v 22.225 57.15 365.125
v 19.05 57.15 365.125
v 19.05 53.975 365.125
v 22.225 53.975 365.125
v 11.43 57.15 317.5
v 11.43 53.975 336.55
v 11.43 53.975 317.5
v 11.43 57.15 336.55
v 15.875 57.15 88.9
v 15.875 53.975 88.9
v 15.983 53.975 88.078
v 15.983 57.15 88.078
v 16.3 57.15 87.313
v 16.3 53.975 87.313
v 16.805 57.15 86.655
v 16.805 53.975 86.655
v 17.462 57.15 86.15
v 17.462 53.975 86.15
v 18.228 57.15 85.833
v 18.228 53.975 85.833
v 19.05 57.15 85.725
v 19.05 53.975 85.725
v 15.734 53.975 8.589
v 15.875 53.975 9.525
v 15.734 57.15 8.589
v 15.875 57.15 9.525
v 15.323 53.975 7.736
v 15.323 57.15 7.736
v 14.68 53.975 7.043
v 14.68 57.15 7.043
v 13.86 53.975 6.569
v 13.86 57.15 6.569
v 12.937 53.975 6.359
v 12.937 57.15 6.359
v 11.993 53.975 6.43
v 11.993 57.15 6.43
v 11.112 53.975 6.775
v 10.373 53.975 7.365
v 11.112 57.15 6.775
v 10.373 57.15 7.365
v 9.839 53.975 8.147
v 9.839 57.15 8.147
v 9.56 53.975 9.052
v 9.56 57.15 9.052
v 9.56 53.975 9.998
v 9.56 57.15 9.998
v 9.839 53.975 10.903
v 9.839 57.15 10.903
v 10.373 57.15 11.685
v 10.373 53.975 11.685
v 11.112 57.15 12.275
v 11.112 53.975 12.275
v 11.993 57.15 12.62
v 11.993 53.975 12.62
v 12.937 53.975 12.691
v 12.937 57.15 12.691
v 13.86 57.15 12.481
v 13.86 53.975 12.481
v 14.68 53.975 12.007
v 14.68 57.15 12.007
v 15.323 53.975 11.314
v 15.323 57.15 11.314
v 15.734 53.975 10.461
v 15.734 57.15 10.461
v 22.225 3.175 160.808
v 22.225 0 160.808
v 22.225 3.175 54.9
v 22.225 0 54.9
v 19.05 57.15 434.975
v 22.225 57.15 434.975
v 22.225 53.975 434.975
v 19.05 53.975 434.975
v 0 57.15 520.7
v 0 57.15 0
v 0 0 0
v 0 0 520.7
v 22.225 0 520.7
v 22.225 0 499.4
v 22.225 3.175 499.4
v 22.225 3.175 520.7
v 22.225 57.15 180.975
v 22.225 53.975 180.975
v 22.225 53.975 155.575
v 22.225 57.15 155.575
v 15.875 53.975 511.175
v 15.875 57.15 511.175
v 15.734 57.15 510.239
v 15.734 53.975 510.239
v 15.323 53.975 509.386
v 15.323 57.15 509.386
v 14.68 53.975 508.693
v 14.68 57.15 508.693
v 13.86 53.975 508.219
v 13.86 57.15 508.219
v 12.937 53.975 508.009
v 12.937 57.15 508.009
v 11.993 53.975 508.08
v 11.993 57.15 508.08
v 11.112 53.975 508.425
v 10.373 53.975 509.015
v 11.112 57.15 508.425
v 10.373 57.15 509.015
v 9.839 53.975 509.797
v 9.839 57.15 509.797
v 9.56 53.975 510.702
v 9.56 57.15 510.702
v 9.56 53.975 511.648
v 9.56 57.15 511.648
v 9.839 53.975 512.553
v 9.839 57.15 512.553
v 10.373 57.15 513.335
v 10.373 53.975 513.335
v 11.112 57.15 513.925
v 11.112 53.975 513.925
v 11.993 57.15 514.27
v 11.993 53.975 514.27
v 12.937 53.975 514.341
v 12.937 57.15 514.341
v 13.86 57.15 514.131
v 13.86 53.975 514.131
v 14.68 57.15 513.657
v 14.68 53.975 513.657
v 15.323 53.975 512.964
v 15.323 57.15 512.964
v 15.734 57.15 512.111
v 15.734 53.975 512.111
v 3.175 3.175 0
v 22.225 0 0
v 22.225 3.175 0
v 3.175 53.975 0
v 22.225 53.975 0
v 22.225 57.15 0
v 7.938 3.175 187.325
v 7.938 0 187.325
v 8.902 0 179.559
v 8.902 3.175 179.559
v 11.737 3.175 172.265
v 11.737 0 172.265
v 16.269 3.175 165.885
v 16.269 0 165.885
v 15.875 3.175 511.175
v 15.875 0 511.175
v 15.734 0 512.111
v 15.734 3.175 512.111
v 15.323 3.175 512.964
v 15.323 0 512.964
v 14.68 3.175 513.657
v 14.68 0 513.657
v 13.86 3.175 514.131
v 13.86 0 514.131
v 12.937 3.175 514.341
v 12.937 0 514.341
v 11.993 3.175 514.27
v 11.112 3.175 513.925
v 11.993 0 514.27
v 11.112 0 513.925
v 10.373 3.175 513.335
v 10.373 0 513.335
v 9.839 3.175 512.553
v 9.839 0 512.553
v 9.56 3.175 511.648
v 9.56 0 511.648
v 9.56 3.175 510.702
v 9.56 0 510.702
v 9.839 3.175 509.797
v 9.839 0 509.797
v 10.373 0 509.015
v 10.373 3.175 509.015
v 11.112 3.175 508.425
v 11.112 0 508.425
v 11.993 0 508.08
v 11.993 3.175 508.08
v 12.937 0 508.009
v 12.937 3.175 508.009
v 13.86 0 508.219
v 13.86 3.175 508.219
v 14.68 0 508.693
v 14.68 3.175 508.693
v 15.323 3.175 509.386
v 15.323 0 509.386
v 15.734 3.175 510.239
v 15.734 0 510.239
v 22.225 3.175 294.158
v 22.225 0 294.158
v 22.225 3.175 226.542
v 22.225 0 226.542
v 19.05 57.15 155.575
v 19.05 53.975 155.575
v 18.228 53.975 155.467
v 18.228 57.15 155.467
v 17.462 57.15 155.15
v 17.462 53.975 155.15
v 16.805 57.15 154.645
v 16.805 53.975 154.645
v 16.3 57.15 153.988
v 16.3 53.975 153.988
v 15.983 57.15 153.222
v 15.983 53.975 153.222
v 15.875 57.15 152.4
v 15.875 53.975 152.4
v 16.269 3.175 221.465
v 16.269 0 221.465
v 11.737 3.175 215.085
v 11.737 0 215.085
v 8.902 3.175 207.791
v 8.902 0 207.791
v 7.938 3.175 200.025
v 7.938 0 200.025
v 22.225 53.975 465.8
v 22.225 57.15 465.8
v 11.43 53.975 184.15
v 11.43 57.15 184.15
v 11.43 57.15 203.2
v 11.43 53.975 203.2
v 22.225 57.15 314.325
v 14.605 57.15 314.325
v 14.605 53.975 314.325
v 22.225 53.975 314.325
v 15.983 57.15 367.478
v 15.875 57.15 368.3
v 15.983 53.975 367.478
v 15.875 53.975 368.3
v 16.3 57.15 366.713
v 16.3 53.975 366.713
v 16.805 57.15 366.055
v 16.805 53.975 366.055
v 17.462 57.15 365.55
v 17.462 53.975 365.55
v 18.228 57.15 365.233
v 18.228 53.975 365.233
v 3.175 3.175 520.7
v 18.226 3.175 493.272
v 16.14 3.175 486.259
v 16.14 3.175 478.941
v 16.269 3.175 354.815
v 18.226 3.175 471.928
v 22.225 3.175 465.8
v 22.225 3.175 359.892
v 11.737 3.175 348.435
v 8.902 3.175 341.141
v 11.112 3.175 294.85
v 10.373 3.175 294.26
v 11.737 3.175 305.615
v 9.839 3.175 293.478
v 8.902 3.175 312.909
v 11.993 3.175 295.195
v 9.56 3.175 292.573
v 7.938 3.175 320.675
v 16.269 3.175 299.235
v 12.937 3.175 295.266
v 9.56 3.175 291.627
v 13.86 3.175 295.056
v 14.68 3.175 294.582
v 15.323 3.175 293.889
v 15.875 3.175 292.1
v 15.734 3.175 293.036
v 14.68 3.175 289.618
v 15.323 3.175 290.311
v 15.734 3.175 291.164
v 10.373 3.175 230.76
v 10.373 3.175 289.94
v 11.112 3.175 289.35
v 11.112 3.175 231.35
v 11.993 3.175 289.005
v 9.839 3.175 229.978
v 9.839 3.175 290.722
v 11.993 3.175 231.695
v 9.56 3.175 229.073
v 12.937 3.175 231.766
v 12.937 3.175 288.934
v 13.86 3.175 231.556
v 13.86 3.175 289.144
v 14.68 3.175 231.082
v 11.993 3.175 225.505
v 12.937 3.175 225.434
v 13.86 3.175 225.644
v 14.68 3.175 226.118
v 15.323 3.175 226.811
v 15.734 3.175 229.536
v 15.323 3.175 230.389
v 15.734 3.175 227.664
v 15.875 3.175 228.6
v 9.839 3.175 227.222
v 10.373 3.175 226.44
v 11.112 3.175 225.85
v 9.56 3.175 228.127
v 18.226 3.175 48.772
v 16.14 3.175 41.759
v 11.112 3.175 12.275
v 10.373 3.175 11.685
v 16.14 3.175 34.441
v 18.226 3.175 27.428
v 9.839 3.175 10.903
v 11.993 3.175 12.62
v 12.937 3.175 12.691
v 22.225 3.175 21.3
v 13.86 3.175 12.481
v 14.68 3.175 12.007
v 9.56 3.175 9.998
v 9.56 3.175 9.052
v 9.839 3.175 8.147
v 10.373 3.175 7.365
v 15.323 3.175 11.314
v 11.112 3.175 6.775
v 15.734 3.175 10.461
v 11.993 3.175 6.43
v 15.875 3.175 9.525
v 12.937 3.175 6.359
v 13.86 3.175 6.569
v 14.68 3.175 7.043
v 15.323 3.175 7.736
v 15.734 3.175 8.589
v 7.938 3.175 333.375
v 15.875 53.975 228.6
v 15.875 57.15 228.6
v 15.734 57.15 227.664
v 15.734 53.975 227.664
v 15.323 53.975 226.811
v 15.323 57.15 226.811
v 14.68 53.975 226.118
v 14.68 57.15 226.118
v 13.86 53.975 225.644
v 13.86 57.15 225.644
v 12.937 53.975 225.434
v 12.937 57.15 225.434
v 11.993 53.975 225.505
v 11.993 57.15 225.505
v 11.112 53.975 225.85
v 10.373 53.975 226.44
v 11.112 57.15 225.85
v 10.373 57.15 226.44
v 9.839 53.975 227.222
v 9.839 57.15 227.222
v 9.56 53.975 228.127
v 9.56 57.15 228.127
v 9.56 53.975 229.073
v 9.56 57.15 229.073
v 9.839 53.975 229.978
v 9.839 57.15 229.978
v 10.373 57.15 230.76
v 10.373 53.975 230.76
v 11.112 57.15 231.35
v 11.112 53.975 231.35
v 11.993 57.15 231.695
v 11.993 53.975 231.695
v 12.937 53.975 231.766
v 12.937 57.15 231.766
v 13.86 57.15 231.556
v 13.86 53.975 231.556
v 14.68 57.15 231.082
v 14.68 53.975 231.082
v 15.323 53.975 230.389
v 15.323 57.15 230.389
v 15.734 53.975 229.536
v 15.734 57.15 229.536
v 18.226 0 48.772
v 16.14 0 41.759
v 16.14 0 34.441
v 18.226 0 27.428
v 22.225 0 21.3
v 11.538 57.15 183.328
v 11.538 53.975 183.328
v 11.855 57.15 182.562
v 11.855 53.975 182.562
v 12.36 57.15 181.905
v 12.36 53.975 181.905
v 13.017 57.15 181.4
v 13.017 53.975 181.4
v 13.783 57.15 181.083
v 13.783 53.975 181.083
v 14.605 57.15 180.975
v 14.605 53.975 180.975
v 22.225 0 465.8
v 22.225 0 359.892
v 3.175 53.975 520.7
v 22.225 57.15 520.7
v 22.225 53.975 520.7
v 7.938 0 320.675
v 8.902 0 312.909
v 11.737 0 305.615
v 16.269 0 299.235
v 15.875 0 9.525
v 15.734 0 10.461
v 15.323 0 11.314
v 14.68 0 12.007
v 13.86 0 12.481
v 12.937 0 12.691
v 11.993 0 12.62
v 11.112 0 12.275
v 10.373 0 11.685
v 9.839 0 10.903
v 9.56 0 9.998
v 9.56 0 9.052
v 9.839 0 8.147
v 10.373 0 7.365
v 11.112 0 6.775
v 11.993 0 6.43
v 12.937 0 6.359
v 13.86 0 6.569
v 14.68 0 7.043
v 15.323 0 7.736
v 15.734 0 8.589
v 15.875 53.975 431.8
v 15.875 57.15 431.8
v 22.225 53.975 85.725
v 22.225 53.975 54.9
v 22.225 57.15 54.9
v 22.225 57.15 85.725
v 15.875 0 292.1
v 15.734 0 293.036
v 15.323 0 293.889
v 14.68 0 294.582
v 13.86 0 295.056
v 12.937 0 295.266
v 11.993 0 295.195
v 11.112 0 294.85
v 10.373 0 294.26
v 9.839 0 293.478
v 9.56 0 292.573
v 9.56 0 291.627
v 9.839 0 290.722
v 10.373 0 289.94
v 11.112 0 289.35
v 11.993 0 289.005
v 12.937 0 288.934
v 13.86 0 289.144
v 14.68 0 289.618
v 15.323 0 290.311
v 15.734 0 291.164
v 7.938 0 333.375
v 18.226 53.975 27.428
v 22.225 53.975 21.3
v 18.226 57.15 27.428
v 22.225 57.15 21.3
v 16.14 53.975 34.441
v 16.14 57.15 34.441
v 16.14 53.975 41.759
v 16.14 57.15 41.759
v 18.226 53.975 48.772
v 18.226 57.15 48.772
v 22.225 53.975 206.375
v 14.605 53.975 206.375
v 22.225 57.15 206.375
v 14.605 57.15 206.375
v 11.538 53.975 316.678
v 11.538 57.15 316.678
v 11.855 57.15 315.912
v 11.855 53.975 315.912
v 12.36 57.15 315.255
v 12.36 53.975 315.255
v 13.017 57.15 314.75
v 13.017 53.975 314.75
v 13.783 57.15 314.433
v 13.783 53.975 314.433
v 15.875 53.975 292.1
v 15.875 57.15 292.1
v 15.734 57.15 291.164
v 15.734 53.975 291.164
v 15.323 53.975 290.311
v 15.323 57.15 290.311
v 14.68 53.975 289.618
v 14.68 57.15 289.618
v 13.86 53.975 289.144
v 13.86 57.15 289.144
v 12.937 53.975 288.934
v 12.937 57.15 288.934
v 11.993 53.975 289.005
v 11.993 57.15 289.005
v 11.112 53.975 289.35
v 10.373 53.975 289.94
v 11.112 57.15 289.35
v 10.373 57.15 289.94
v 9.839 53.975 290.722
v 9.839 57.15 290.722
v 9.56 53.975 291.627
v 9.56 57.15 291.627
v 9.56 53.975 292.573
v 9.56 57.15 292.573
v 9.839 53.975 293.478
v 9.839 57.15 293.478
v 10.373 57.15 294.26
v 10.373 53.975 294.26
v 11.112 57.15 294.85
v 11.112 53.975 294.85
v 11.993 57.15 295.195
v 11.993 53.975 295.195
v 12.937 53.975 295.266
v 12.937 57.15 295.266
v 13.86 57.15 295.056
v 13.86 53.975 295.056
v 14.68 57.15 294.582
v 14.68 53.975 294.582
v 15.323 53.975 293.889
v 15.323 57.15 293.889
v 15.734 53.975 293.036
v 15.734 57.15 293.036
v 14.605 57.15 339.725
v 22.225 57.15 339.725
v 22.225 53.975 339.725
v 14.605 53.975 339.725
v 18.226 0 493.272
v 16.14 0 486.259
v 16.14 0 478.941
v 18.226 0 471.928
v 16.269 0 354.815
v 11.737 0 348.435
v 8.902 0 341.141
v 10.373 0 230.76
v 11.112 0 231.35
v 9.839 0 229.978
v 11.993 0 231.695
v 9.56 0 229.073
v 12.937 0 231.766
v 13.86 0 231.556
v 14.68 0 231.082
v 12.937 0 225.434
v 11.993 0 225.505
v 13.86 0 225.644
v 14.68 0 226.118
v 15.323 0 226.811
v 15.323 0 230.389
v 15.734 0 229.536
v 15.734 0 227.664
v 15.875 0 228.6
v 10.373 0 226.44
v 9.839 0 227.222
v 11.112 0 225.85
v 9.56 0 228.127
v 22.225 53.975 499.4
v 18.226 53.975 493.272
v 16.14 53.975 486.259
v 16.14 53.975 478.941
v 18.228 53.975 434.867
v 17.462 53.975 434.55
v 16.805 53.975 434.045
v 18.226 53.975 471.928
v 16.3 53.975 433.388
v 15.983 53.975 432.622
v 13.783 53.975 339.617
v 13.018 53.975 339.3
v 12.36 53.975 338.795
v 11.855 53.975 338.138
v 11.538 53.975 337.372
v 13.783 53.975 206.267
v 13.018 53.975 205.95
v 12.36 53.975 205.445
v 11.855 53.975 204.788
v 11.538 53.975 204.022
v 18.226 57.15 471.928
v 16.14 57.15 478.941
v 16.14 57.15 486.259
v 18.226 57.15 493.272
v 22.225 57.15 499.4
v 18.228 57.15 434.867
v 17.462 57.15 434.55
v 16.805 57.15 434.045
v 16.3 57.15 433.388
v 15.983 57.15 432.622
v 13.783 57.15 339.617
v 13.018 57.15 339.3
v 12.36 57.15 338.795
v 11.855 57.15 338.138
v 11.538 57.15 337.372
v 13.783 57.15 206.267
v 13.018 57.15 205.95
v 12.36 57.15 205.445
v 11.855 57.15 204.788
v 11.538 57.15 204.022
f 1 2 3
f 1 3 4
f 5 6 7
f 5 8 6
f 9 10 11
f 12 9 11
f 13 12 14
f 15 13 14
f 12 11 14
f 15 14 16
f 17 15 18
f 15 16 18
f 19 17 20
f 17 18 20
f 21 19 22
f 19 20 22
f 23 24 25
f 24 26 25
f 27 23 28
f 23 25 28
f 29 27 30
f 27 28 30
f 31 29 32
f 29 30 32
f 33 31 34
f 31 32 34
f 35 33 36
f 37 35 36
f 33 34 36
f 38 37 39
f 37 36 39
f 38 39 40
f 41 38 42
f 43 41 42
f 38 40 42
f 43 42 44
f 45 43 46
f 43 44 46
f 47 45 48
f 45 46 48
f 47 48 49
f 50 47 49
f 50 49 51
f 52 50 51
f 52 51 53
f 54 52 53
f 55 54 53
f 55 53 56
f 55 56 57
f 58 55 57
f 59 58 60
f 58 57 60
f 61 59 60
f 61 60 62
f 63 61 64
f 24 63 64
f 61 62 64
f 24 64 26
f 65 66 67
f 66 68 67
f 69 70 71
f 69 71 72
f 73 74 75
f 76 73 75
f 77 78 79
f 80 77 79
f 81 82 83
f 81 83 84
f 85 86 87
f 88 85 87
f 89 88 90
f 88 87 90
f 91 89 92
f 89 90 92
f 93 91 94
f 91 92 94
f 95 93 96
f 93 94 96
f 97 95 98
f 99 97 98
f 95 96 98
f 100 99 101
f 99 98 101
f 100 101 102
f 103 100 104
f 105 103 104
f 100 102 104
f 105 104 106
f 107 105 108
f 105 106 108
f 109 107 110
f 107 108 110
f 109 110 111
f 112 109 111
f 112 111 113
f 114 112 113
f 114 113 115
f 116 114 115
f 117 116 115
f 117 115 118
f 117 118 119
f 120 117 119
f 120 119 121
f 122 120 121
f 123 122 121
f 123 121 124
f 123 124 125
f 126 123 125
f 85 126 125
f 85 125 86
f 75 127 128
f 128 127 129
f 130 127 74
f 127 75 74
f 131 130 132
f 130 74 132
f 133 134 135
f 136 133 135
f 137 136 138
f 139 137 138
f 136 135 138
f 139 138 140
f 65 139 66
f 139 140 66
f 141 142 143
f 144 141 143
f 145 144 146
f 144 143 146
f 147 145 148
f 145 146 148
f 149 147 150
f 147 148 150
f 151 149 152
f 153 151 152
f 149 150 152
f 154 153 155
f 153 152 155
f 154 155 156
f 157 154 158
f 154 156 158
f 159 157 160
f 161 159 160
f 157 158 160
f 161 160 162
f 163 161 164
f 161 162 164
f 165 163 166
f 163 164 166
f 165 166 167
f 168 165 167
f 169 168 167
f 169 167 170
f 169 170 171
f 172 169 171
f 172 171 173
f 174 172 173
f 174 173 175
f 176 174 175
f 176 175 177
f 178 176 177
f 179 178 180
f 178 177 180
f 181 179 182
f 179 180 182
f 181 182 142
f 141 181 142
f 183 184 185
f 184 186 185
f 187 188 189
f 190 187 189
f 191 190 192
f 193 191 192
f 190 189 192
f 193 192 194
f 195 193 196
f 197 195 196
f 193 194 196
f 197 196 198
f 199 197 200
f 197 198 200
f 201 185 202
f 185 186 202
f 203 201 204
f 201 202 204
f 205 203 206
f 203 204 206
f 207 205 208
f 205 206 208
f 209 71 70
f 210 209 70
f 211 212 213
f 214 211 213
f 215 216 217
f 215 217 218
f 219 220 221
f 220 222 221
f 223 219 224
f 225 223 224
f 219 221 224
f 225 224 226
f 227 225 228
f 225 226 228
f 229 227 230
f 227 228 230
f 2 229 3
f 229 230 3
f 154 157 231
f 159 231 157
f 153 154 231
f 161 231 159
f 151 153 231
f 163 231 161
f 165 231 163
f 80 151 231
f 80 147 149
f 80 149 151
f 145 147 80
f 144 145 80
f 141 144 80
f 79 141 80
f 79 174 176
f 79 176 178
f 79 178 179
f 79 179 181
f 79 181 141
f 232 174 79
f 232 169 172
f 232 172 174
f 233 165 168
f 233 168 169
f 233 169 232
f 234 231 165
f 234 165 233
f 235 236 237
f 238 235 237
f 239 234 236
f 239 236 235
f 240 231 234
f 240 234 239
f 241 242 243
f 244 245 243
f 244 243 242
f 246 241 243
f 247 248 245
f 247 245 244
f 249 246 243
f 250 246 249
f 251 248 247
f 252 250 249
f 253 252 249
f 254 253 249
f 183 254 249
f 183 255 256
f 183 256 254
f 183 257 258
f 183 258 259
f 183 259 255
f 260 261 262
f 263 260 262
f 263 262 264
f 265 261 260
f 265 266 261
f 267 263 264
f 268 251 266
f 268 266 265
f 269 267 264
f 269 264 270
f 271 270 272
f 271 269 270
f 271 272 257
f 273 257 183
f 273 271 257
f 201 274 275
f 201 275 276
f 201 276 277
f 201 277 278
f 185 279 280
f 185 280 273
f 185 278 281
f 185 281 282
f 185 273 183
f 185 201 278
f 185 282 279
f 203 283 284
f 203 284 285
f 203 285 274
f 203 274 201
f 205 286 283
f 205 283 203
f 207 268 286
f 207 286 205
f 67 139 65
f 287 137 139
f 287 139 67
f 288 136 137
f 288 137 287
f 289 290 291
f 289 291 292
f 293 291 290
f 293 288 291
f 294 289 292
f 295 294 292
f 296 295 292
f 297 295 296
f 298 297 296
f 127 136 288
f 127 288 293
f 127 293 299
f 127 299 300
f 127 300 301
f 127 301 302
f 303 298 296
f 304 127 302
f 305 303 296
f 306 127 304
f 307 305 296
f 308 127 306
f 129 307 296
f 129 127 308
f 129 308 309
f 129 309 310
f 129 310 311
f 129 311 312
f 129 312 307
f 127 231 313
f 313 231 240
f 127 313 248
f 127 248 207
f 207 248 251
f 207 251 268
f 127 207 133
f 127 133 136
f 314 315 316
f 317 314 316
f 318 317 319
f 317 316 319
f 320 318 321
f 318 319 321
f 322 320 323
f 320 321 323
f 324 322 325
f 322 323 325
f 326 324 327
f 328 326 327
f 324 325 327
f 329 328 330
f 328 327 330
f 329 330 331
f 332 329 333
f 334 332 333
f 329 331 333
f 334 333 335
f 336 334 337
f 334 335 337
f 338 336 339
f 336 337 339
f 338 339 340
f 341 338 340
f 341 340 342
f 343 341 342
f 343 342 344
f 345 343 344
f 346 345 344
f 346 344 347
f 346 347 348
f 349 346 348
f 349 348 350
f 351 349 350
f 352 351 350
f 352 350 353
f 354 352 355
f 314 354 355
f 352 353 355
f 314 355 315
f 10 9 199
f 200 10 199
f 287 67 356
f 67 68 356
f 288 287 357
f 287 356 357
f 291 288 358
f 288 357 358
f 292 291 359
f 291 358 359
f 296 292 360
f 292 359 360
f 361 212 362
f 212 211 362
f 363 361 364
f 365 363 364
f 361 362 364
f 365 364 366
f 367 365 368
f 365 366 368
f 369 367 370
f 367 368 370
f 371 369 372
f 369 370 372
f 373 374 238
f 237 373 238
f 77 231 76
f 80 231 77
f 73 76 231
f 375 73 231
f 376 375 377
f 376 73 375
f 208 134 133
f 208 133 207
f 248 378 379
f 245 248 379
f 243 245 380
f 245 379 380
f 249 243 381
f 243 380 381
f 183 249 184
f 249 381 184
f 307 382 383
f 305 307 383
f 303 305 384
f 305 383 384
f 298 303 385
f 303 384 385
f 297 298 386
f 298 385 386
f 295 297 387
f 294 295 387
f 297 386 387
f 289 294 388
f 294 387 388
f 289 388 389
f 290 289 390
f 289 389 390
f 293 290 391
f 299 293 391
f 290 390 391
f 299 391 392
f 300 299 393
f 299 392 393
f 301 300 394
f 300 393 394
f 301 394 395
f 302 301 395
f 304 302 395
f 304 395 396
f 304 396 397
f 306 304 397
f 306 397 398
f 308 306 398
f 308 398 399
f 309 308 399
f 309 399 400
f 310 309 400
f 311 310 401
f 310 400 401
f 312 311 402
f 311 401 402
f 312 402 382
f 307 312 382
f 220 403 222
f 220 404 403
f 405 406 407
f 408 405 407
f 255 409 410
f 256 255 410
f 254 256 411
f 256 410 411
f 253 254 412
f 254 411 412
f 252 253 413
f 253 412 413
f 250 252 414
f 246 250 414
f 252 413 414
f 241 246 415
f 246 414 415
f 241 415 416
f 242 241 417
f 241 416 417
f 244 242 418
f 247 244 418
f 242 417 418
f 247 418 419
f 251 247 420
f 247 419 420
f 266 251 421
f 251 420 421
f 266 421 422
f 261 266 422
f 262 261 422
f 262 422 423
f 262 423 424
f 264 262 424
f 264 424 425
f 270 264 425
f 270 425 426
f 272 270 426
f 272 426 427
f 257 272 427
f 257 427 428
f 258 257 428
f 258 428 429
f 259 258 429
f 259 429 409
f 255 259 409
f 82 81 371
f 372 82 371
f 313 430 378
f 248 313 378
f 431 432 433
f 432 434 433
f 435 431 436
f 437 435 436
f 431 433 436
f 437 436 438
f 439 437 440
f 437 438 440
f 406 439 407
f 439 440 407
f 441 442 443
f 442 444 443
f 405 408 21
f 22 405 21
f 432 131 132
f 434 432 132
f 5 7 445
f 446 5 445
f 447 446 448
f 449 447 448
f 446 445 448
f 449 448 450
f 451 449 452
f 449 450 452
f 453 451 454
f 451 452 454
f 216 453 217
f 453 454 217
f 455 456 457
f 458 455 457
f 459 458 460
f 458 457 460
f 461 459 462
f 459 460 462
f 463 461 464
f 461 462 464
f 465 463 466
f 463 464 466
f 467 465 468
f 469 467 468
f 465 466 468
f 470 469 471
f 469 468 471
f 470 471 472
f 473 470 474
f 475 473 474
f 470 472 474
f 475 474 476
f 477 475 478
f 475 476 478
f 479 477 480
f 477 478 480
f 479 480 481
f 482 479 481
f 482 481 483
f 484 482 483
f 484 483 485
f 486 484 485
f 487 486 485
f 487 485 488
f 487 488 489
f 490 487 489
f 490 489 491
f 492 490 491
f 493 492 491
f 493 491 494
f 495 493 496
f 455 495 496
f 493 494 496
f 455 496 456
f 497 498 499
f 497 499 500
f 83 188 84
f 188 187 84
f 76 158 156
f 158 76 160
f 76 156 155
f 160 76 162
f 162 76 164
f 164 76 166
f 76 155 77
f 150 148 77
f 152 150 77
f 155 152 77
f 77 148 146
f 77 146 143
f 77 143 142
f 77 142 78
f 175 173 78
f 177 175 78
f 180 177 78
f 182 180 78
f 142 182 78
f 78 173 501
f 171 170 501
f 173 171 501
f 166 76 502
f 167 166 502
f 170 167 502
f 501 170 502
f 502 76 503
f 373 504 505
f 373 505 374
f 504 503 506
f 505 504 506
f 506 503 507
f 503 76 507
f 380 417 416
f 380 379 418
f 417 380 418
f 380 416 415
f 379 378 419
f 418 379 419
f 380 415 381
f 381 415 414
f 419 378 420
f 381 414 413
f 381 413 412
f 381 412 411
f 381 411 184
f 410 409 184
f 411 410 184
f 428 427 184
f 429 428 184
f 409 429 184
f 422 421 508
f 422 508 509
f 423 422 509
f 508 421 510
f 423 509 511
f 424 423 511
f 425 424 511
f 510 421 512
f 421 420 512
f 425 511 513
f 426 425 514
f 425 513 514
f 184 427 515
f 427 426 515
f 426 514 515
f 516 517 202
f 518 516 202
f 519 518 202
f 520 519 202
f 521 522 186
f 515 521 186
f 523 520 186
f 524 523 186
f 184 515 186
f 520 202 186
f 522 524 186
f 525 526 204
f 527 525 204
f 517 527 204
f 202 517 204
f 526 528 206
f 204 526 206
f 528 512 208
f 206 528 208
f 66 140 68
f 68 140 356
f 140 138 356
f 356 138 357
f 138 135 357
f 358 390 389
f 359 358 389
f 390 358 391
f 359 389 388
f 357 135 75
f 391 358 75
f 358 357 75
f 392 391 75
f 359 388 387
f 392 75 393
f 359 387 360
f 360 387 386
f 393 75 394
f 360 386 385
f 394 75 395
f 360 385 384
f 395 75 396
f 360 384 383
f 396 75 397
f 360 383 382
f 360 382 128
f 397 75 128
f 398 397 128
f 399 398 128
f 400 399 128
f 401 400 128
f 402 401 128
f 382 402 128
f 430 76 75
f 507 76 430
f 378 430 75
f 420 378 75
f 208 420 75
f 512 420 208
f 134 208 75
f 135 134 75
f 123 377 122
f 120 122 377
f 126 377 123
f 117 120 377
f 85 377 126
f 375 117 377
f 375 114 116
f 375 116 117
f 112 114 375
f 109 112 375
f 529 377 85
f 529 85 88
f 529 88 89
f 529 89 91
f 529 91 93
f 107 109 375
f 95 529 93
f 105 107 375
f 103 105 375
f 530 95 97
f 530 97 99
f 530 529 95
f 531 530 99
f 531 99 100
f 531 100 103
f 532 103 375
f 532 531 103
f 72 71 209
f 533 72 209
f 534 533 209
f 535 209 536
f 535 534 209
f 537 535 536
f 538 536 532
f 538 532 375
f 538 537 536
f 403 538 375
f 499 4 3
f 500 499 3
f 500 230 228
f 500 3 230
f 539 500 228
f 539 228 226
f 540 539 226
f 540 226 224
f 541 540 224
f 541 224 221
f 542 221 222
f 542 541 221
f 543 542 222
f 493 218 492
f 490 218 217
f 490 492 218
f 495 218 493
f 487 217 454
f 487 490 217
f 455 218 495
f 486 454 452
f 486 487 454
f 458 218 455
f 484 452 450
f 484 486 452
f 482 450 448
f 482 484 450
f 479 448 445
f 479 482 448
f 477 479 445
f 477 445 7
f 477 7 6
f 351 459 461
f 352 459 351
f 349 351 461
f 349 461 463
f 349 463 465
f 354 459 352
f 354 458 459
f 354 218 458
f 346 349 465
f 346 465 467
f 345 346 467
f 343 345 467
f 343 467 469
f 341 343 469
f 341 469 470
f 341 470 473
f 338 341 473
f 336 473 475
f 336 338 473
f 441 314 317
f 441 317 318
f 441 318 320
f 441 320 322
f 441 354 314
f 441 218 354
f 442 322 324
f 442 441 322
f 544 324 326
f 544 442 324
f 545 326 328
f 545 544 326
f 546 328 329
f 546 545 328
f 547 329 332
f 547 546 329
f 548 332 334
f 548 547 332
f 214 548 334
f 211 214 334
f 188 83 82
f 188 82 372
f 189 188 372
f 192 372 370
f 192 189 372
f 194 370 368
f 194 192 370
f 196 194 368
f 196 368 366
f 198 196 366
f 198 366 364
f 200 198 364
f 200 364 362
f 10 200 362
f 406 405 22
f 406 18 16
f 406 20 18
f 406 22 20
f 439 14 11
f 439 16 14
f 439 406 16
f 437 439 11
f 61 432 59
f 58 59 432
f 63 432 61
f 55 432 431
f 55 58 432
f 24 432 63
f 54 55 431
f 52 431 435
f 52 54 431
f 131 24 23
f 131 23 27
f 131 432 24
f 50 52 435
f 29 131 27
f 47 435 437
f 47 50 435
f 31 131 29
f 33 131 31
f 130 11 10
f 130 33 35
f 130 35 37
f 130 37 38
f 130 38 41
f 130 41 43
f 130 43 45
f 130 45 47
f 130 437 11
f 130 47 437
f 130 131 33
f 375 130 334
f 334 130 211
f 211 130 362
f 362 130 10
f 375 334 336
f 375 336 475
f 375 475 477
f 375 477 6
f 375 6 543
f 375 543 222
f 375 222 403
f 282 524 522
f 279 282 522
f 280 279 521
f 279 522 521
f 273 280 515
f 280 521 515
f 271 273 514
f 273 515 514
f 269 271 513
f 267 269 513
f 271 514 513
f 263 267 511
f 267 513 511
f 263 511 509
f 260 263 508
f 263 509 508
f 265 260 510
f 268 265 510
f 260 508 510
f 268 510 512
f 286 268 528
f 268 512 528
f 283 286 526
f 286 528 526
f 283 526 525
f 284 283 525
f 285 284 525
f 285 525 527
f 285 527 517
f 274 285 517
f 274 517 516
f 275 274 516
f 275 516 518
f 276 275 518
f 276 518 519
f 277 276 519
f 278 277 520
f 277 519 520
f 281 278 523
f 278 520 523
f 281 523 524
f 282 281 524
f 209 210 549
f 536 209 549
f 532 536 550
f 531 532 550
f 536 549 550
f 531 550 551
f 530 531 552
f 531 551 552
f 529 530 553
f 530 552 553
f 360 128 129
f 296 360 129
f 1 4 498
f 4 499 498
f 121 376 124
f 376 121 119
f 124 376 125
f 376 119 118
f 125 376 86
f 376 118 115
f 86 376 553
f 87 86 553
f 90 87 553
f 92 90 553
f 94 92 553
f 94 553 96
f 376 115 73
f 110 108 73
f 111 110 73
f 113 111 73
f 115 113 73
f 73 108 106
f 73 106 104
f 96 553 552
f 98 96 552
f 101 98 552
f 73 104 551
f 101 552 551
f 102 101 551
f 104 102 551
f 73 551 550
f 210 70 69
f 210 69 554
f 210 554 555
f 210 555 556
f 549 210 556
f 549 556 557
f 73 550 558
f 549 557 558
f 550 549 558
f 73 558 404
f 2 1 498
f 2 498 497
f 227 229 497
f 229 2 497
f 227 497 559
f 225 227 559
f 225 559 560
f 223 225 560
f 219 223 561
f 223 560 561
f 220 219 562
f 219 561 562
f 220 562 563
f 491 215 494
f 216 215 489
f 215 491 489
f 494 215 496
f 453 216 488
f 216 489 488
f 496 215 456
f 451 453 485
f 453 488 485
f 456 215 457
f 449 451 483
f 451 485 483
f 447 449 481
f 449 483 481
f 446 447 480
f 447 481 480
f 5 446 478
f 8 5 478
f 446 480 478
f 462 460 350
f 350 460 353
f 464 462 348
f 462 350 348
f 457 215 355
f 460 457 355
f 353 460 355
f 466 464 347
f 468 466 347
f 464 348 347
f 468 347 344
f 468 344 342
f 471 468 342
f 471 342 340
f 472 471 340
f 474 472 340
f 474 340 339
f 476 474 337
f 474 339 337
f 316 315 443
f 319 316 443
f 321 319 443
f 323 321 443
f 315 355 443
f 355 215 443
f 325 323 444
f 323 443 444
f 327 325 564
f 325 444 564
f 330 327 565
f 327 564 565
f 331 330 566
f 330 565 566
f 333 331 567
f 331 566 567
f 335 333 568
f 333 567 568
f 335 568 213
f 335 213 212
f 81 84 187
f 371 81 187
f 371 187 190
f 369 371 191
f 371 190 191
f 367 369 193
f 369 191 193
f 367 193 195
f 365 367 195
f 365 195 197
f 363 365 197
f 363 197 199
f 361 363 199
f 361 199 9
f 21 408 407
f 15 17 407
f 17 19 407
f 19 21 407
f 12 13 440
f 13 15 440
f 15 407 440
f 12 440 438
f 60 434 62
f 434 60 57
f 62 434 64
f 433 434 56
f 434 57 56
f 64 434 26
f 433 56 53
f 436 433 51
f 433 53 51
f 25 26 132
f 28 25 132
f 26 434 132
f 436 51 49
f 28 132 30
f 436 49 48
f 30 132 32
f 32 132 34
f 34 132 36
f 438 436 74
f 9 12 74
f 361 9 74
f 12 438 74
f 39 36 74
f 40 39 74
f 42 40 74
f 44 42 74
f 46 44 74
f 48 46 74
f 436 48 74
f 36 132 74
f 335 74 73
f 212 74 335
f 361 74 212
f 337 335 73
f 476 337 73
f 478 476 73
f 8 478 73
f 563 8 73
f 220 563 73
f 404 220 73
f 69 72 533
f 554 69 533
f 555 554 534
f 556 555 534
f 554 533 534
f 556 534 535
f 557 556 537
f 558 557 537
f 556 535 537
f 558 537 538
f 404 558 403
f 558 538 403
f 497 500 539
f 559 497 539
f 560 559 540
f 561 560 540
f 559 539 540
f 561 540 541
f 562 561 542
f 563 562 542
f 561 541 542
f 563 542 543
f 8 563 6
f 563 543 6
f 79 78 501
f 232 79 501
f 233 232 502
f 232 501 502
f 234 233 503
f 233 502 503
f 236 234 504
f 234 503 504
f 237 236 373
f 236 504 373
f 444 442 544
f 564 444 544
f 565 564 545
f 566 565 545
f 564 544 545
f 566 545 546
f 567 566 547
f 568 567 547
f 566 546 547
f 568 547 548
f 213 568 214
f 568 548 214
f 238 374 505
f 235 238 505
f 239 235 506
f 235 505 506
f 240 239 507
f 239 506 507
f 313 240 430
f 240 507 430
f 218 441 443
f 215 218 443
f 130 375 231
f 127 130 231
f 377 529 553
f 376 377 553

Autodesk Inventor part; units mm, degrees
ref_plane "YZ Plane" through (0, 0, 0) normal (1, 0, 0) x (0, 1, 0)
ref_plane "XZ Plane" through (0, 0, 0) normal (0, 1, 0) x (-1, 0, 0)
ref_plane "XY Plane" through (0, 0, 0) normal (0, 0, 1) x (1, 0, 0)
sketch "Sketch1" plane through (0, 0, 0) normal (0, 0, 1) x (1, 0, 0)
  line L0 (0, 0) -> (22.225, 0)
  line L1 (22.225, 0) -> (22.225, 57.15)
  line L2 (22.225, 57.15) -> (0, 57.15)
  line L3 (0, 57.15) -> (0, 0)
  line L4 (3.175, 3.175) -> (22.225, 3.175)
  line L5 (22.225, 3.175) -> (22.225, 53.975)
  line L6 (22.225, 53.975) -> (3.175, 53.975)
  line L7 (3.175, 53.975) -> (3.175, 3.175)
  dimension "d0" = 3.175
  dimension "d1" = 3.175
  dimension "d2" = 3.175
  dimension "d3" = 57.15
  dimension "d4" = 22.225
extrude "Extrusion1" add sketch "Sketch1" along normal blind 520.7 contours L3 L2 L1 L6 L7 L4 L0
sketch "Sketch2" plane through (0, 57.15, 0) normal (0, 1, 0) x (1, 0, 0)
  line L0 (22.225, 0) -> (22.225, -520.7) projected
  line L1 (0, 0) -> (0, -520.7) projected
  line L2 (22.7547, 0) -> (0, 0)
  line L3 (22.225, -85.725) -> (15.875, -85.725)
  line L4 (15.875, -85.725) -> (15.875, -155.575)
  line L5 (15.875, -155.575) -> (22.225, -155.575)
  line L6 (22.225, -155.575) -> (22.225, -85.725)
  line L7 (22.225, -180.975) -> (11.43, -180.975)
  line L8 (11.43, -180.975) -> (11.43, -206.375)
  line L9 (11.43, -206.375) -> (22.225, -206.375)
  line L10 (22.225, -206.375) -> (22.225, -180.975)
  arc A0 (22.225, -21.2995) -> (22.225, -54.9005) centre (41.275, -38.1) ccw
  circle A1 centre (12.7, -9.525) radius 3.175
  circle A2 centre (12.7, -228.6) radius 3.175
  line L11 (3.175, 0) -> (3.175, -520.7) projected
  line L12 (22.225, 0) -> (0, 0) projected
  line L13 (22.225, -21.2995) -> (22.225, -54.9005)
  line L14 (0, -260.35) -> (22.225, -260.35) construction
  line L15 (22.225, -339.725) -> (11.43, -339.725)
  line L16 (11.43, -339.725) -> (11.43, -314.325)
  line L17 (22.225, -314.325) -> (22.225, -339.725)
  line L18 (11.43, -314.325) -> (22.225, -314.325)
  circle A3 centre (12.7, -292.1) radius 3.175
  line L19 (15.875, -365.125) -> (22.225, -365.125)
  line L20 (15.875, -434.975) -> (15.875, -365.125)
  line L21 (22.225, -365.125) -> (22.225, -434.975)
  line L22 (22.225, -434.975) -> (15.875, -434.975)
  arc A4 (22.225, -465.7995) -> (22.225, -499.4005) centre (41.275, -482.6) ccw
  circle A5 centre (12.7, -511.175) radius 3.175
  line L23 (22.225, -520.7) -> (0, -520.7)
  line L24 (22.225, -499.4005) -> (22.225, -465.7995)
  dimension "d7" = 85.725
  dimension "d8" = 69.85
  dimension "d9" = 6.35
  dimension "d10" = 180.975
  dimension "d11" = 25.4
  dimension "d12" = 25.4
  dimension "d13" = 38.1
  dimension "d14" = 9.525
  dimension "d15" = 6.35
  dimension "d16" = 228.6
  dimension "d17" = 38.1
  dimension "d18" = 11.43
  dimension "d21" = 260.35
extrude "Extrusion2" cut sketch "Sketch2" against normal blind 3.175 contours L0 A0 | L0 L5 L4 L3 | A4 L0 | L0 L9 L8 L7 | L22 L20 L19 L0 | L0 L15 L16 L18 | A1 | A2 | A3 | A5
sketch "Sketch3" plane through (0, 0, 0) normal (0, -1, 0) x (1, 0, 0)
  line L0 (0, 0) -> (0, 520.7) projected
  line L1 (0, 0) -> (22.225, 0) projected
  line L2 (22.225, 0) -> (22.225, 520.7) projected
  line L3 (0, 0) -> (0, 301.9932)
  line L4 (0, 0) -> (22.225, 0)
  line L5 (22.225, 0) -> (22.225, 21.2995)
  arc A0 (7.9375, 187.325) -> (22.225, 160.8085) centre (39.6875, 187.325) ccw
  line L6 (7.9375, 187.325) -> (7.9375, 200.025)
  arc A1 (22.225, 226.5415) -> (7.9375, 200.025) centre (39.6875, 200.025) ccw
  arc A2 (22.225, 54.9005) -> (22.225, 21.2995) centre (41.275, 38.1) ccw
  circle A3 centre (12.7, 9.525) radius 3.175
  circle A4 centre (12.7, 228.6) radius 3.175
  line L7 (3.175, 0) -> (3.175, 520.7) projected
  line L8 (0, 260.35) -> (22.225, 260.35) construction
  line L9 (22.225, 160.8085) -> (22.225, 226.5415)
  line L10 (22.225, 226.5415) -> (22.225, 302.1048)
  line L11 (22.225, 21.2995) -> (22.225, 54.9005)
  line L12 (22.225, 54.9005) -> (22.225, 160.8085)
  arc A5 (22.225, 359.8915) -> (7.9375, 333.375) centre (39.6875, 333.375) ccw
  line L13 (7.9375, 333.375) -> (7.9375, 320.675)
  arc A6 (7.9375, 320.675) -> (22.225, 294.1585) centre (39.6875, 320.675) ccw
  arc A7 (22.225, 499.4005) -> (22.225, 465.7995) centre (41.275, 482.6) ccw
  circle A8 centre (12.7, 511.175) radius 3.175
  circle A9 centre (12.7, 292.1) radius 3.175
  line L14 (22.225, 359.8915) -> (22.225, 294.1585)
  line L15 (22.225, 499.4005) -> (22.225, 465.7995)
  dimension "d22" = 31.75
  dimension "d23" = 12.7
  dimension "d24" = 187.325
  dimension "d25" = 7.9375
  dimension "d26" = 38.1
  dimension "d27" = 38.1
  dimension "d28" = 25.4
  dimension "d29" = 260.35
extrude "Extrusion3" cut sketch "Sketch3" against normal blind 3.175
fillet "Fillet1" radius 3.175 8 edges at (15.875, 55.5625, 434.975) (15.875, 55.5625, 365.125) (11.43, 55.5625, 339.725) (11.43, 55.5625, 314.325) (11.43, 55.5625, 206.375) (11.43, 55.5625, 180.975) (15.875, 55.5625, 155.575) (15.875, 55.5625, 85.725)
equation "\"d1\" = d0"
equation "\"d2\" = d0"
properties part number "2.25 U frame 2"
